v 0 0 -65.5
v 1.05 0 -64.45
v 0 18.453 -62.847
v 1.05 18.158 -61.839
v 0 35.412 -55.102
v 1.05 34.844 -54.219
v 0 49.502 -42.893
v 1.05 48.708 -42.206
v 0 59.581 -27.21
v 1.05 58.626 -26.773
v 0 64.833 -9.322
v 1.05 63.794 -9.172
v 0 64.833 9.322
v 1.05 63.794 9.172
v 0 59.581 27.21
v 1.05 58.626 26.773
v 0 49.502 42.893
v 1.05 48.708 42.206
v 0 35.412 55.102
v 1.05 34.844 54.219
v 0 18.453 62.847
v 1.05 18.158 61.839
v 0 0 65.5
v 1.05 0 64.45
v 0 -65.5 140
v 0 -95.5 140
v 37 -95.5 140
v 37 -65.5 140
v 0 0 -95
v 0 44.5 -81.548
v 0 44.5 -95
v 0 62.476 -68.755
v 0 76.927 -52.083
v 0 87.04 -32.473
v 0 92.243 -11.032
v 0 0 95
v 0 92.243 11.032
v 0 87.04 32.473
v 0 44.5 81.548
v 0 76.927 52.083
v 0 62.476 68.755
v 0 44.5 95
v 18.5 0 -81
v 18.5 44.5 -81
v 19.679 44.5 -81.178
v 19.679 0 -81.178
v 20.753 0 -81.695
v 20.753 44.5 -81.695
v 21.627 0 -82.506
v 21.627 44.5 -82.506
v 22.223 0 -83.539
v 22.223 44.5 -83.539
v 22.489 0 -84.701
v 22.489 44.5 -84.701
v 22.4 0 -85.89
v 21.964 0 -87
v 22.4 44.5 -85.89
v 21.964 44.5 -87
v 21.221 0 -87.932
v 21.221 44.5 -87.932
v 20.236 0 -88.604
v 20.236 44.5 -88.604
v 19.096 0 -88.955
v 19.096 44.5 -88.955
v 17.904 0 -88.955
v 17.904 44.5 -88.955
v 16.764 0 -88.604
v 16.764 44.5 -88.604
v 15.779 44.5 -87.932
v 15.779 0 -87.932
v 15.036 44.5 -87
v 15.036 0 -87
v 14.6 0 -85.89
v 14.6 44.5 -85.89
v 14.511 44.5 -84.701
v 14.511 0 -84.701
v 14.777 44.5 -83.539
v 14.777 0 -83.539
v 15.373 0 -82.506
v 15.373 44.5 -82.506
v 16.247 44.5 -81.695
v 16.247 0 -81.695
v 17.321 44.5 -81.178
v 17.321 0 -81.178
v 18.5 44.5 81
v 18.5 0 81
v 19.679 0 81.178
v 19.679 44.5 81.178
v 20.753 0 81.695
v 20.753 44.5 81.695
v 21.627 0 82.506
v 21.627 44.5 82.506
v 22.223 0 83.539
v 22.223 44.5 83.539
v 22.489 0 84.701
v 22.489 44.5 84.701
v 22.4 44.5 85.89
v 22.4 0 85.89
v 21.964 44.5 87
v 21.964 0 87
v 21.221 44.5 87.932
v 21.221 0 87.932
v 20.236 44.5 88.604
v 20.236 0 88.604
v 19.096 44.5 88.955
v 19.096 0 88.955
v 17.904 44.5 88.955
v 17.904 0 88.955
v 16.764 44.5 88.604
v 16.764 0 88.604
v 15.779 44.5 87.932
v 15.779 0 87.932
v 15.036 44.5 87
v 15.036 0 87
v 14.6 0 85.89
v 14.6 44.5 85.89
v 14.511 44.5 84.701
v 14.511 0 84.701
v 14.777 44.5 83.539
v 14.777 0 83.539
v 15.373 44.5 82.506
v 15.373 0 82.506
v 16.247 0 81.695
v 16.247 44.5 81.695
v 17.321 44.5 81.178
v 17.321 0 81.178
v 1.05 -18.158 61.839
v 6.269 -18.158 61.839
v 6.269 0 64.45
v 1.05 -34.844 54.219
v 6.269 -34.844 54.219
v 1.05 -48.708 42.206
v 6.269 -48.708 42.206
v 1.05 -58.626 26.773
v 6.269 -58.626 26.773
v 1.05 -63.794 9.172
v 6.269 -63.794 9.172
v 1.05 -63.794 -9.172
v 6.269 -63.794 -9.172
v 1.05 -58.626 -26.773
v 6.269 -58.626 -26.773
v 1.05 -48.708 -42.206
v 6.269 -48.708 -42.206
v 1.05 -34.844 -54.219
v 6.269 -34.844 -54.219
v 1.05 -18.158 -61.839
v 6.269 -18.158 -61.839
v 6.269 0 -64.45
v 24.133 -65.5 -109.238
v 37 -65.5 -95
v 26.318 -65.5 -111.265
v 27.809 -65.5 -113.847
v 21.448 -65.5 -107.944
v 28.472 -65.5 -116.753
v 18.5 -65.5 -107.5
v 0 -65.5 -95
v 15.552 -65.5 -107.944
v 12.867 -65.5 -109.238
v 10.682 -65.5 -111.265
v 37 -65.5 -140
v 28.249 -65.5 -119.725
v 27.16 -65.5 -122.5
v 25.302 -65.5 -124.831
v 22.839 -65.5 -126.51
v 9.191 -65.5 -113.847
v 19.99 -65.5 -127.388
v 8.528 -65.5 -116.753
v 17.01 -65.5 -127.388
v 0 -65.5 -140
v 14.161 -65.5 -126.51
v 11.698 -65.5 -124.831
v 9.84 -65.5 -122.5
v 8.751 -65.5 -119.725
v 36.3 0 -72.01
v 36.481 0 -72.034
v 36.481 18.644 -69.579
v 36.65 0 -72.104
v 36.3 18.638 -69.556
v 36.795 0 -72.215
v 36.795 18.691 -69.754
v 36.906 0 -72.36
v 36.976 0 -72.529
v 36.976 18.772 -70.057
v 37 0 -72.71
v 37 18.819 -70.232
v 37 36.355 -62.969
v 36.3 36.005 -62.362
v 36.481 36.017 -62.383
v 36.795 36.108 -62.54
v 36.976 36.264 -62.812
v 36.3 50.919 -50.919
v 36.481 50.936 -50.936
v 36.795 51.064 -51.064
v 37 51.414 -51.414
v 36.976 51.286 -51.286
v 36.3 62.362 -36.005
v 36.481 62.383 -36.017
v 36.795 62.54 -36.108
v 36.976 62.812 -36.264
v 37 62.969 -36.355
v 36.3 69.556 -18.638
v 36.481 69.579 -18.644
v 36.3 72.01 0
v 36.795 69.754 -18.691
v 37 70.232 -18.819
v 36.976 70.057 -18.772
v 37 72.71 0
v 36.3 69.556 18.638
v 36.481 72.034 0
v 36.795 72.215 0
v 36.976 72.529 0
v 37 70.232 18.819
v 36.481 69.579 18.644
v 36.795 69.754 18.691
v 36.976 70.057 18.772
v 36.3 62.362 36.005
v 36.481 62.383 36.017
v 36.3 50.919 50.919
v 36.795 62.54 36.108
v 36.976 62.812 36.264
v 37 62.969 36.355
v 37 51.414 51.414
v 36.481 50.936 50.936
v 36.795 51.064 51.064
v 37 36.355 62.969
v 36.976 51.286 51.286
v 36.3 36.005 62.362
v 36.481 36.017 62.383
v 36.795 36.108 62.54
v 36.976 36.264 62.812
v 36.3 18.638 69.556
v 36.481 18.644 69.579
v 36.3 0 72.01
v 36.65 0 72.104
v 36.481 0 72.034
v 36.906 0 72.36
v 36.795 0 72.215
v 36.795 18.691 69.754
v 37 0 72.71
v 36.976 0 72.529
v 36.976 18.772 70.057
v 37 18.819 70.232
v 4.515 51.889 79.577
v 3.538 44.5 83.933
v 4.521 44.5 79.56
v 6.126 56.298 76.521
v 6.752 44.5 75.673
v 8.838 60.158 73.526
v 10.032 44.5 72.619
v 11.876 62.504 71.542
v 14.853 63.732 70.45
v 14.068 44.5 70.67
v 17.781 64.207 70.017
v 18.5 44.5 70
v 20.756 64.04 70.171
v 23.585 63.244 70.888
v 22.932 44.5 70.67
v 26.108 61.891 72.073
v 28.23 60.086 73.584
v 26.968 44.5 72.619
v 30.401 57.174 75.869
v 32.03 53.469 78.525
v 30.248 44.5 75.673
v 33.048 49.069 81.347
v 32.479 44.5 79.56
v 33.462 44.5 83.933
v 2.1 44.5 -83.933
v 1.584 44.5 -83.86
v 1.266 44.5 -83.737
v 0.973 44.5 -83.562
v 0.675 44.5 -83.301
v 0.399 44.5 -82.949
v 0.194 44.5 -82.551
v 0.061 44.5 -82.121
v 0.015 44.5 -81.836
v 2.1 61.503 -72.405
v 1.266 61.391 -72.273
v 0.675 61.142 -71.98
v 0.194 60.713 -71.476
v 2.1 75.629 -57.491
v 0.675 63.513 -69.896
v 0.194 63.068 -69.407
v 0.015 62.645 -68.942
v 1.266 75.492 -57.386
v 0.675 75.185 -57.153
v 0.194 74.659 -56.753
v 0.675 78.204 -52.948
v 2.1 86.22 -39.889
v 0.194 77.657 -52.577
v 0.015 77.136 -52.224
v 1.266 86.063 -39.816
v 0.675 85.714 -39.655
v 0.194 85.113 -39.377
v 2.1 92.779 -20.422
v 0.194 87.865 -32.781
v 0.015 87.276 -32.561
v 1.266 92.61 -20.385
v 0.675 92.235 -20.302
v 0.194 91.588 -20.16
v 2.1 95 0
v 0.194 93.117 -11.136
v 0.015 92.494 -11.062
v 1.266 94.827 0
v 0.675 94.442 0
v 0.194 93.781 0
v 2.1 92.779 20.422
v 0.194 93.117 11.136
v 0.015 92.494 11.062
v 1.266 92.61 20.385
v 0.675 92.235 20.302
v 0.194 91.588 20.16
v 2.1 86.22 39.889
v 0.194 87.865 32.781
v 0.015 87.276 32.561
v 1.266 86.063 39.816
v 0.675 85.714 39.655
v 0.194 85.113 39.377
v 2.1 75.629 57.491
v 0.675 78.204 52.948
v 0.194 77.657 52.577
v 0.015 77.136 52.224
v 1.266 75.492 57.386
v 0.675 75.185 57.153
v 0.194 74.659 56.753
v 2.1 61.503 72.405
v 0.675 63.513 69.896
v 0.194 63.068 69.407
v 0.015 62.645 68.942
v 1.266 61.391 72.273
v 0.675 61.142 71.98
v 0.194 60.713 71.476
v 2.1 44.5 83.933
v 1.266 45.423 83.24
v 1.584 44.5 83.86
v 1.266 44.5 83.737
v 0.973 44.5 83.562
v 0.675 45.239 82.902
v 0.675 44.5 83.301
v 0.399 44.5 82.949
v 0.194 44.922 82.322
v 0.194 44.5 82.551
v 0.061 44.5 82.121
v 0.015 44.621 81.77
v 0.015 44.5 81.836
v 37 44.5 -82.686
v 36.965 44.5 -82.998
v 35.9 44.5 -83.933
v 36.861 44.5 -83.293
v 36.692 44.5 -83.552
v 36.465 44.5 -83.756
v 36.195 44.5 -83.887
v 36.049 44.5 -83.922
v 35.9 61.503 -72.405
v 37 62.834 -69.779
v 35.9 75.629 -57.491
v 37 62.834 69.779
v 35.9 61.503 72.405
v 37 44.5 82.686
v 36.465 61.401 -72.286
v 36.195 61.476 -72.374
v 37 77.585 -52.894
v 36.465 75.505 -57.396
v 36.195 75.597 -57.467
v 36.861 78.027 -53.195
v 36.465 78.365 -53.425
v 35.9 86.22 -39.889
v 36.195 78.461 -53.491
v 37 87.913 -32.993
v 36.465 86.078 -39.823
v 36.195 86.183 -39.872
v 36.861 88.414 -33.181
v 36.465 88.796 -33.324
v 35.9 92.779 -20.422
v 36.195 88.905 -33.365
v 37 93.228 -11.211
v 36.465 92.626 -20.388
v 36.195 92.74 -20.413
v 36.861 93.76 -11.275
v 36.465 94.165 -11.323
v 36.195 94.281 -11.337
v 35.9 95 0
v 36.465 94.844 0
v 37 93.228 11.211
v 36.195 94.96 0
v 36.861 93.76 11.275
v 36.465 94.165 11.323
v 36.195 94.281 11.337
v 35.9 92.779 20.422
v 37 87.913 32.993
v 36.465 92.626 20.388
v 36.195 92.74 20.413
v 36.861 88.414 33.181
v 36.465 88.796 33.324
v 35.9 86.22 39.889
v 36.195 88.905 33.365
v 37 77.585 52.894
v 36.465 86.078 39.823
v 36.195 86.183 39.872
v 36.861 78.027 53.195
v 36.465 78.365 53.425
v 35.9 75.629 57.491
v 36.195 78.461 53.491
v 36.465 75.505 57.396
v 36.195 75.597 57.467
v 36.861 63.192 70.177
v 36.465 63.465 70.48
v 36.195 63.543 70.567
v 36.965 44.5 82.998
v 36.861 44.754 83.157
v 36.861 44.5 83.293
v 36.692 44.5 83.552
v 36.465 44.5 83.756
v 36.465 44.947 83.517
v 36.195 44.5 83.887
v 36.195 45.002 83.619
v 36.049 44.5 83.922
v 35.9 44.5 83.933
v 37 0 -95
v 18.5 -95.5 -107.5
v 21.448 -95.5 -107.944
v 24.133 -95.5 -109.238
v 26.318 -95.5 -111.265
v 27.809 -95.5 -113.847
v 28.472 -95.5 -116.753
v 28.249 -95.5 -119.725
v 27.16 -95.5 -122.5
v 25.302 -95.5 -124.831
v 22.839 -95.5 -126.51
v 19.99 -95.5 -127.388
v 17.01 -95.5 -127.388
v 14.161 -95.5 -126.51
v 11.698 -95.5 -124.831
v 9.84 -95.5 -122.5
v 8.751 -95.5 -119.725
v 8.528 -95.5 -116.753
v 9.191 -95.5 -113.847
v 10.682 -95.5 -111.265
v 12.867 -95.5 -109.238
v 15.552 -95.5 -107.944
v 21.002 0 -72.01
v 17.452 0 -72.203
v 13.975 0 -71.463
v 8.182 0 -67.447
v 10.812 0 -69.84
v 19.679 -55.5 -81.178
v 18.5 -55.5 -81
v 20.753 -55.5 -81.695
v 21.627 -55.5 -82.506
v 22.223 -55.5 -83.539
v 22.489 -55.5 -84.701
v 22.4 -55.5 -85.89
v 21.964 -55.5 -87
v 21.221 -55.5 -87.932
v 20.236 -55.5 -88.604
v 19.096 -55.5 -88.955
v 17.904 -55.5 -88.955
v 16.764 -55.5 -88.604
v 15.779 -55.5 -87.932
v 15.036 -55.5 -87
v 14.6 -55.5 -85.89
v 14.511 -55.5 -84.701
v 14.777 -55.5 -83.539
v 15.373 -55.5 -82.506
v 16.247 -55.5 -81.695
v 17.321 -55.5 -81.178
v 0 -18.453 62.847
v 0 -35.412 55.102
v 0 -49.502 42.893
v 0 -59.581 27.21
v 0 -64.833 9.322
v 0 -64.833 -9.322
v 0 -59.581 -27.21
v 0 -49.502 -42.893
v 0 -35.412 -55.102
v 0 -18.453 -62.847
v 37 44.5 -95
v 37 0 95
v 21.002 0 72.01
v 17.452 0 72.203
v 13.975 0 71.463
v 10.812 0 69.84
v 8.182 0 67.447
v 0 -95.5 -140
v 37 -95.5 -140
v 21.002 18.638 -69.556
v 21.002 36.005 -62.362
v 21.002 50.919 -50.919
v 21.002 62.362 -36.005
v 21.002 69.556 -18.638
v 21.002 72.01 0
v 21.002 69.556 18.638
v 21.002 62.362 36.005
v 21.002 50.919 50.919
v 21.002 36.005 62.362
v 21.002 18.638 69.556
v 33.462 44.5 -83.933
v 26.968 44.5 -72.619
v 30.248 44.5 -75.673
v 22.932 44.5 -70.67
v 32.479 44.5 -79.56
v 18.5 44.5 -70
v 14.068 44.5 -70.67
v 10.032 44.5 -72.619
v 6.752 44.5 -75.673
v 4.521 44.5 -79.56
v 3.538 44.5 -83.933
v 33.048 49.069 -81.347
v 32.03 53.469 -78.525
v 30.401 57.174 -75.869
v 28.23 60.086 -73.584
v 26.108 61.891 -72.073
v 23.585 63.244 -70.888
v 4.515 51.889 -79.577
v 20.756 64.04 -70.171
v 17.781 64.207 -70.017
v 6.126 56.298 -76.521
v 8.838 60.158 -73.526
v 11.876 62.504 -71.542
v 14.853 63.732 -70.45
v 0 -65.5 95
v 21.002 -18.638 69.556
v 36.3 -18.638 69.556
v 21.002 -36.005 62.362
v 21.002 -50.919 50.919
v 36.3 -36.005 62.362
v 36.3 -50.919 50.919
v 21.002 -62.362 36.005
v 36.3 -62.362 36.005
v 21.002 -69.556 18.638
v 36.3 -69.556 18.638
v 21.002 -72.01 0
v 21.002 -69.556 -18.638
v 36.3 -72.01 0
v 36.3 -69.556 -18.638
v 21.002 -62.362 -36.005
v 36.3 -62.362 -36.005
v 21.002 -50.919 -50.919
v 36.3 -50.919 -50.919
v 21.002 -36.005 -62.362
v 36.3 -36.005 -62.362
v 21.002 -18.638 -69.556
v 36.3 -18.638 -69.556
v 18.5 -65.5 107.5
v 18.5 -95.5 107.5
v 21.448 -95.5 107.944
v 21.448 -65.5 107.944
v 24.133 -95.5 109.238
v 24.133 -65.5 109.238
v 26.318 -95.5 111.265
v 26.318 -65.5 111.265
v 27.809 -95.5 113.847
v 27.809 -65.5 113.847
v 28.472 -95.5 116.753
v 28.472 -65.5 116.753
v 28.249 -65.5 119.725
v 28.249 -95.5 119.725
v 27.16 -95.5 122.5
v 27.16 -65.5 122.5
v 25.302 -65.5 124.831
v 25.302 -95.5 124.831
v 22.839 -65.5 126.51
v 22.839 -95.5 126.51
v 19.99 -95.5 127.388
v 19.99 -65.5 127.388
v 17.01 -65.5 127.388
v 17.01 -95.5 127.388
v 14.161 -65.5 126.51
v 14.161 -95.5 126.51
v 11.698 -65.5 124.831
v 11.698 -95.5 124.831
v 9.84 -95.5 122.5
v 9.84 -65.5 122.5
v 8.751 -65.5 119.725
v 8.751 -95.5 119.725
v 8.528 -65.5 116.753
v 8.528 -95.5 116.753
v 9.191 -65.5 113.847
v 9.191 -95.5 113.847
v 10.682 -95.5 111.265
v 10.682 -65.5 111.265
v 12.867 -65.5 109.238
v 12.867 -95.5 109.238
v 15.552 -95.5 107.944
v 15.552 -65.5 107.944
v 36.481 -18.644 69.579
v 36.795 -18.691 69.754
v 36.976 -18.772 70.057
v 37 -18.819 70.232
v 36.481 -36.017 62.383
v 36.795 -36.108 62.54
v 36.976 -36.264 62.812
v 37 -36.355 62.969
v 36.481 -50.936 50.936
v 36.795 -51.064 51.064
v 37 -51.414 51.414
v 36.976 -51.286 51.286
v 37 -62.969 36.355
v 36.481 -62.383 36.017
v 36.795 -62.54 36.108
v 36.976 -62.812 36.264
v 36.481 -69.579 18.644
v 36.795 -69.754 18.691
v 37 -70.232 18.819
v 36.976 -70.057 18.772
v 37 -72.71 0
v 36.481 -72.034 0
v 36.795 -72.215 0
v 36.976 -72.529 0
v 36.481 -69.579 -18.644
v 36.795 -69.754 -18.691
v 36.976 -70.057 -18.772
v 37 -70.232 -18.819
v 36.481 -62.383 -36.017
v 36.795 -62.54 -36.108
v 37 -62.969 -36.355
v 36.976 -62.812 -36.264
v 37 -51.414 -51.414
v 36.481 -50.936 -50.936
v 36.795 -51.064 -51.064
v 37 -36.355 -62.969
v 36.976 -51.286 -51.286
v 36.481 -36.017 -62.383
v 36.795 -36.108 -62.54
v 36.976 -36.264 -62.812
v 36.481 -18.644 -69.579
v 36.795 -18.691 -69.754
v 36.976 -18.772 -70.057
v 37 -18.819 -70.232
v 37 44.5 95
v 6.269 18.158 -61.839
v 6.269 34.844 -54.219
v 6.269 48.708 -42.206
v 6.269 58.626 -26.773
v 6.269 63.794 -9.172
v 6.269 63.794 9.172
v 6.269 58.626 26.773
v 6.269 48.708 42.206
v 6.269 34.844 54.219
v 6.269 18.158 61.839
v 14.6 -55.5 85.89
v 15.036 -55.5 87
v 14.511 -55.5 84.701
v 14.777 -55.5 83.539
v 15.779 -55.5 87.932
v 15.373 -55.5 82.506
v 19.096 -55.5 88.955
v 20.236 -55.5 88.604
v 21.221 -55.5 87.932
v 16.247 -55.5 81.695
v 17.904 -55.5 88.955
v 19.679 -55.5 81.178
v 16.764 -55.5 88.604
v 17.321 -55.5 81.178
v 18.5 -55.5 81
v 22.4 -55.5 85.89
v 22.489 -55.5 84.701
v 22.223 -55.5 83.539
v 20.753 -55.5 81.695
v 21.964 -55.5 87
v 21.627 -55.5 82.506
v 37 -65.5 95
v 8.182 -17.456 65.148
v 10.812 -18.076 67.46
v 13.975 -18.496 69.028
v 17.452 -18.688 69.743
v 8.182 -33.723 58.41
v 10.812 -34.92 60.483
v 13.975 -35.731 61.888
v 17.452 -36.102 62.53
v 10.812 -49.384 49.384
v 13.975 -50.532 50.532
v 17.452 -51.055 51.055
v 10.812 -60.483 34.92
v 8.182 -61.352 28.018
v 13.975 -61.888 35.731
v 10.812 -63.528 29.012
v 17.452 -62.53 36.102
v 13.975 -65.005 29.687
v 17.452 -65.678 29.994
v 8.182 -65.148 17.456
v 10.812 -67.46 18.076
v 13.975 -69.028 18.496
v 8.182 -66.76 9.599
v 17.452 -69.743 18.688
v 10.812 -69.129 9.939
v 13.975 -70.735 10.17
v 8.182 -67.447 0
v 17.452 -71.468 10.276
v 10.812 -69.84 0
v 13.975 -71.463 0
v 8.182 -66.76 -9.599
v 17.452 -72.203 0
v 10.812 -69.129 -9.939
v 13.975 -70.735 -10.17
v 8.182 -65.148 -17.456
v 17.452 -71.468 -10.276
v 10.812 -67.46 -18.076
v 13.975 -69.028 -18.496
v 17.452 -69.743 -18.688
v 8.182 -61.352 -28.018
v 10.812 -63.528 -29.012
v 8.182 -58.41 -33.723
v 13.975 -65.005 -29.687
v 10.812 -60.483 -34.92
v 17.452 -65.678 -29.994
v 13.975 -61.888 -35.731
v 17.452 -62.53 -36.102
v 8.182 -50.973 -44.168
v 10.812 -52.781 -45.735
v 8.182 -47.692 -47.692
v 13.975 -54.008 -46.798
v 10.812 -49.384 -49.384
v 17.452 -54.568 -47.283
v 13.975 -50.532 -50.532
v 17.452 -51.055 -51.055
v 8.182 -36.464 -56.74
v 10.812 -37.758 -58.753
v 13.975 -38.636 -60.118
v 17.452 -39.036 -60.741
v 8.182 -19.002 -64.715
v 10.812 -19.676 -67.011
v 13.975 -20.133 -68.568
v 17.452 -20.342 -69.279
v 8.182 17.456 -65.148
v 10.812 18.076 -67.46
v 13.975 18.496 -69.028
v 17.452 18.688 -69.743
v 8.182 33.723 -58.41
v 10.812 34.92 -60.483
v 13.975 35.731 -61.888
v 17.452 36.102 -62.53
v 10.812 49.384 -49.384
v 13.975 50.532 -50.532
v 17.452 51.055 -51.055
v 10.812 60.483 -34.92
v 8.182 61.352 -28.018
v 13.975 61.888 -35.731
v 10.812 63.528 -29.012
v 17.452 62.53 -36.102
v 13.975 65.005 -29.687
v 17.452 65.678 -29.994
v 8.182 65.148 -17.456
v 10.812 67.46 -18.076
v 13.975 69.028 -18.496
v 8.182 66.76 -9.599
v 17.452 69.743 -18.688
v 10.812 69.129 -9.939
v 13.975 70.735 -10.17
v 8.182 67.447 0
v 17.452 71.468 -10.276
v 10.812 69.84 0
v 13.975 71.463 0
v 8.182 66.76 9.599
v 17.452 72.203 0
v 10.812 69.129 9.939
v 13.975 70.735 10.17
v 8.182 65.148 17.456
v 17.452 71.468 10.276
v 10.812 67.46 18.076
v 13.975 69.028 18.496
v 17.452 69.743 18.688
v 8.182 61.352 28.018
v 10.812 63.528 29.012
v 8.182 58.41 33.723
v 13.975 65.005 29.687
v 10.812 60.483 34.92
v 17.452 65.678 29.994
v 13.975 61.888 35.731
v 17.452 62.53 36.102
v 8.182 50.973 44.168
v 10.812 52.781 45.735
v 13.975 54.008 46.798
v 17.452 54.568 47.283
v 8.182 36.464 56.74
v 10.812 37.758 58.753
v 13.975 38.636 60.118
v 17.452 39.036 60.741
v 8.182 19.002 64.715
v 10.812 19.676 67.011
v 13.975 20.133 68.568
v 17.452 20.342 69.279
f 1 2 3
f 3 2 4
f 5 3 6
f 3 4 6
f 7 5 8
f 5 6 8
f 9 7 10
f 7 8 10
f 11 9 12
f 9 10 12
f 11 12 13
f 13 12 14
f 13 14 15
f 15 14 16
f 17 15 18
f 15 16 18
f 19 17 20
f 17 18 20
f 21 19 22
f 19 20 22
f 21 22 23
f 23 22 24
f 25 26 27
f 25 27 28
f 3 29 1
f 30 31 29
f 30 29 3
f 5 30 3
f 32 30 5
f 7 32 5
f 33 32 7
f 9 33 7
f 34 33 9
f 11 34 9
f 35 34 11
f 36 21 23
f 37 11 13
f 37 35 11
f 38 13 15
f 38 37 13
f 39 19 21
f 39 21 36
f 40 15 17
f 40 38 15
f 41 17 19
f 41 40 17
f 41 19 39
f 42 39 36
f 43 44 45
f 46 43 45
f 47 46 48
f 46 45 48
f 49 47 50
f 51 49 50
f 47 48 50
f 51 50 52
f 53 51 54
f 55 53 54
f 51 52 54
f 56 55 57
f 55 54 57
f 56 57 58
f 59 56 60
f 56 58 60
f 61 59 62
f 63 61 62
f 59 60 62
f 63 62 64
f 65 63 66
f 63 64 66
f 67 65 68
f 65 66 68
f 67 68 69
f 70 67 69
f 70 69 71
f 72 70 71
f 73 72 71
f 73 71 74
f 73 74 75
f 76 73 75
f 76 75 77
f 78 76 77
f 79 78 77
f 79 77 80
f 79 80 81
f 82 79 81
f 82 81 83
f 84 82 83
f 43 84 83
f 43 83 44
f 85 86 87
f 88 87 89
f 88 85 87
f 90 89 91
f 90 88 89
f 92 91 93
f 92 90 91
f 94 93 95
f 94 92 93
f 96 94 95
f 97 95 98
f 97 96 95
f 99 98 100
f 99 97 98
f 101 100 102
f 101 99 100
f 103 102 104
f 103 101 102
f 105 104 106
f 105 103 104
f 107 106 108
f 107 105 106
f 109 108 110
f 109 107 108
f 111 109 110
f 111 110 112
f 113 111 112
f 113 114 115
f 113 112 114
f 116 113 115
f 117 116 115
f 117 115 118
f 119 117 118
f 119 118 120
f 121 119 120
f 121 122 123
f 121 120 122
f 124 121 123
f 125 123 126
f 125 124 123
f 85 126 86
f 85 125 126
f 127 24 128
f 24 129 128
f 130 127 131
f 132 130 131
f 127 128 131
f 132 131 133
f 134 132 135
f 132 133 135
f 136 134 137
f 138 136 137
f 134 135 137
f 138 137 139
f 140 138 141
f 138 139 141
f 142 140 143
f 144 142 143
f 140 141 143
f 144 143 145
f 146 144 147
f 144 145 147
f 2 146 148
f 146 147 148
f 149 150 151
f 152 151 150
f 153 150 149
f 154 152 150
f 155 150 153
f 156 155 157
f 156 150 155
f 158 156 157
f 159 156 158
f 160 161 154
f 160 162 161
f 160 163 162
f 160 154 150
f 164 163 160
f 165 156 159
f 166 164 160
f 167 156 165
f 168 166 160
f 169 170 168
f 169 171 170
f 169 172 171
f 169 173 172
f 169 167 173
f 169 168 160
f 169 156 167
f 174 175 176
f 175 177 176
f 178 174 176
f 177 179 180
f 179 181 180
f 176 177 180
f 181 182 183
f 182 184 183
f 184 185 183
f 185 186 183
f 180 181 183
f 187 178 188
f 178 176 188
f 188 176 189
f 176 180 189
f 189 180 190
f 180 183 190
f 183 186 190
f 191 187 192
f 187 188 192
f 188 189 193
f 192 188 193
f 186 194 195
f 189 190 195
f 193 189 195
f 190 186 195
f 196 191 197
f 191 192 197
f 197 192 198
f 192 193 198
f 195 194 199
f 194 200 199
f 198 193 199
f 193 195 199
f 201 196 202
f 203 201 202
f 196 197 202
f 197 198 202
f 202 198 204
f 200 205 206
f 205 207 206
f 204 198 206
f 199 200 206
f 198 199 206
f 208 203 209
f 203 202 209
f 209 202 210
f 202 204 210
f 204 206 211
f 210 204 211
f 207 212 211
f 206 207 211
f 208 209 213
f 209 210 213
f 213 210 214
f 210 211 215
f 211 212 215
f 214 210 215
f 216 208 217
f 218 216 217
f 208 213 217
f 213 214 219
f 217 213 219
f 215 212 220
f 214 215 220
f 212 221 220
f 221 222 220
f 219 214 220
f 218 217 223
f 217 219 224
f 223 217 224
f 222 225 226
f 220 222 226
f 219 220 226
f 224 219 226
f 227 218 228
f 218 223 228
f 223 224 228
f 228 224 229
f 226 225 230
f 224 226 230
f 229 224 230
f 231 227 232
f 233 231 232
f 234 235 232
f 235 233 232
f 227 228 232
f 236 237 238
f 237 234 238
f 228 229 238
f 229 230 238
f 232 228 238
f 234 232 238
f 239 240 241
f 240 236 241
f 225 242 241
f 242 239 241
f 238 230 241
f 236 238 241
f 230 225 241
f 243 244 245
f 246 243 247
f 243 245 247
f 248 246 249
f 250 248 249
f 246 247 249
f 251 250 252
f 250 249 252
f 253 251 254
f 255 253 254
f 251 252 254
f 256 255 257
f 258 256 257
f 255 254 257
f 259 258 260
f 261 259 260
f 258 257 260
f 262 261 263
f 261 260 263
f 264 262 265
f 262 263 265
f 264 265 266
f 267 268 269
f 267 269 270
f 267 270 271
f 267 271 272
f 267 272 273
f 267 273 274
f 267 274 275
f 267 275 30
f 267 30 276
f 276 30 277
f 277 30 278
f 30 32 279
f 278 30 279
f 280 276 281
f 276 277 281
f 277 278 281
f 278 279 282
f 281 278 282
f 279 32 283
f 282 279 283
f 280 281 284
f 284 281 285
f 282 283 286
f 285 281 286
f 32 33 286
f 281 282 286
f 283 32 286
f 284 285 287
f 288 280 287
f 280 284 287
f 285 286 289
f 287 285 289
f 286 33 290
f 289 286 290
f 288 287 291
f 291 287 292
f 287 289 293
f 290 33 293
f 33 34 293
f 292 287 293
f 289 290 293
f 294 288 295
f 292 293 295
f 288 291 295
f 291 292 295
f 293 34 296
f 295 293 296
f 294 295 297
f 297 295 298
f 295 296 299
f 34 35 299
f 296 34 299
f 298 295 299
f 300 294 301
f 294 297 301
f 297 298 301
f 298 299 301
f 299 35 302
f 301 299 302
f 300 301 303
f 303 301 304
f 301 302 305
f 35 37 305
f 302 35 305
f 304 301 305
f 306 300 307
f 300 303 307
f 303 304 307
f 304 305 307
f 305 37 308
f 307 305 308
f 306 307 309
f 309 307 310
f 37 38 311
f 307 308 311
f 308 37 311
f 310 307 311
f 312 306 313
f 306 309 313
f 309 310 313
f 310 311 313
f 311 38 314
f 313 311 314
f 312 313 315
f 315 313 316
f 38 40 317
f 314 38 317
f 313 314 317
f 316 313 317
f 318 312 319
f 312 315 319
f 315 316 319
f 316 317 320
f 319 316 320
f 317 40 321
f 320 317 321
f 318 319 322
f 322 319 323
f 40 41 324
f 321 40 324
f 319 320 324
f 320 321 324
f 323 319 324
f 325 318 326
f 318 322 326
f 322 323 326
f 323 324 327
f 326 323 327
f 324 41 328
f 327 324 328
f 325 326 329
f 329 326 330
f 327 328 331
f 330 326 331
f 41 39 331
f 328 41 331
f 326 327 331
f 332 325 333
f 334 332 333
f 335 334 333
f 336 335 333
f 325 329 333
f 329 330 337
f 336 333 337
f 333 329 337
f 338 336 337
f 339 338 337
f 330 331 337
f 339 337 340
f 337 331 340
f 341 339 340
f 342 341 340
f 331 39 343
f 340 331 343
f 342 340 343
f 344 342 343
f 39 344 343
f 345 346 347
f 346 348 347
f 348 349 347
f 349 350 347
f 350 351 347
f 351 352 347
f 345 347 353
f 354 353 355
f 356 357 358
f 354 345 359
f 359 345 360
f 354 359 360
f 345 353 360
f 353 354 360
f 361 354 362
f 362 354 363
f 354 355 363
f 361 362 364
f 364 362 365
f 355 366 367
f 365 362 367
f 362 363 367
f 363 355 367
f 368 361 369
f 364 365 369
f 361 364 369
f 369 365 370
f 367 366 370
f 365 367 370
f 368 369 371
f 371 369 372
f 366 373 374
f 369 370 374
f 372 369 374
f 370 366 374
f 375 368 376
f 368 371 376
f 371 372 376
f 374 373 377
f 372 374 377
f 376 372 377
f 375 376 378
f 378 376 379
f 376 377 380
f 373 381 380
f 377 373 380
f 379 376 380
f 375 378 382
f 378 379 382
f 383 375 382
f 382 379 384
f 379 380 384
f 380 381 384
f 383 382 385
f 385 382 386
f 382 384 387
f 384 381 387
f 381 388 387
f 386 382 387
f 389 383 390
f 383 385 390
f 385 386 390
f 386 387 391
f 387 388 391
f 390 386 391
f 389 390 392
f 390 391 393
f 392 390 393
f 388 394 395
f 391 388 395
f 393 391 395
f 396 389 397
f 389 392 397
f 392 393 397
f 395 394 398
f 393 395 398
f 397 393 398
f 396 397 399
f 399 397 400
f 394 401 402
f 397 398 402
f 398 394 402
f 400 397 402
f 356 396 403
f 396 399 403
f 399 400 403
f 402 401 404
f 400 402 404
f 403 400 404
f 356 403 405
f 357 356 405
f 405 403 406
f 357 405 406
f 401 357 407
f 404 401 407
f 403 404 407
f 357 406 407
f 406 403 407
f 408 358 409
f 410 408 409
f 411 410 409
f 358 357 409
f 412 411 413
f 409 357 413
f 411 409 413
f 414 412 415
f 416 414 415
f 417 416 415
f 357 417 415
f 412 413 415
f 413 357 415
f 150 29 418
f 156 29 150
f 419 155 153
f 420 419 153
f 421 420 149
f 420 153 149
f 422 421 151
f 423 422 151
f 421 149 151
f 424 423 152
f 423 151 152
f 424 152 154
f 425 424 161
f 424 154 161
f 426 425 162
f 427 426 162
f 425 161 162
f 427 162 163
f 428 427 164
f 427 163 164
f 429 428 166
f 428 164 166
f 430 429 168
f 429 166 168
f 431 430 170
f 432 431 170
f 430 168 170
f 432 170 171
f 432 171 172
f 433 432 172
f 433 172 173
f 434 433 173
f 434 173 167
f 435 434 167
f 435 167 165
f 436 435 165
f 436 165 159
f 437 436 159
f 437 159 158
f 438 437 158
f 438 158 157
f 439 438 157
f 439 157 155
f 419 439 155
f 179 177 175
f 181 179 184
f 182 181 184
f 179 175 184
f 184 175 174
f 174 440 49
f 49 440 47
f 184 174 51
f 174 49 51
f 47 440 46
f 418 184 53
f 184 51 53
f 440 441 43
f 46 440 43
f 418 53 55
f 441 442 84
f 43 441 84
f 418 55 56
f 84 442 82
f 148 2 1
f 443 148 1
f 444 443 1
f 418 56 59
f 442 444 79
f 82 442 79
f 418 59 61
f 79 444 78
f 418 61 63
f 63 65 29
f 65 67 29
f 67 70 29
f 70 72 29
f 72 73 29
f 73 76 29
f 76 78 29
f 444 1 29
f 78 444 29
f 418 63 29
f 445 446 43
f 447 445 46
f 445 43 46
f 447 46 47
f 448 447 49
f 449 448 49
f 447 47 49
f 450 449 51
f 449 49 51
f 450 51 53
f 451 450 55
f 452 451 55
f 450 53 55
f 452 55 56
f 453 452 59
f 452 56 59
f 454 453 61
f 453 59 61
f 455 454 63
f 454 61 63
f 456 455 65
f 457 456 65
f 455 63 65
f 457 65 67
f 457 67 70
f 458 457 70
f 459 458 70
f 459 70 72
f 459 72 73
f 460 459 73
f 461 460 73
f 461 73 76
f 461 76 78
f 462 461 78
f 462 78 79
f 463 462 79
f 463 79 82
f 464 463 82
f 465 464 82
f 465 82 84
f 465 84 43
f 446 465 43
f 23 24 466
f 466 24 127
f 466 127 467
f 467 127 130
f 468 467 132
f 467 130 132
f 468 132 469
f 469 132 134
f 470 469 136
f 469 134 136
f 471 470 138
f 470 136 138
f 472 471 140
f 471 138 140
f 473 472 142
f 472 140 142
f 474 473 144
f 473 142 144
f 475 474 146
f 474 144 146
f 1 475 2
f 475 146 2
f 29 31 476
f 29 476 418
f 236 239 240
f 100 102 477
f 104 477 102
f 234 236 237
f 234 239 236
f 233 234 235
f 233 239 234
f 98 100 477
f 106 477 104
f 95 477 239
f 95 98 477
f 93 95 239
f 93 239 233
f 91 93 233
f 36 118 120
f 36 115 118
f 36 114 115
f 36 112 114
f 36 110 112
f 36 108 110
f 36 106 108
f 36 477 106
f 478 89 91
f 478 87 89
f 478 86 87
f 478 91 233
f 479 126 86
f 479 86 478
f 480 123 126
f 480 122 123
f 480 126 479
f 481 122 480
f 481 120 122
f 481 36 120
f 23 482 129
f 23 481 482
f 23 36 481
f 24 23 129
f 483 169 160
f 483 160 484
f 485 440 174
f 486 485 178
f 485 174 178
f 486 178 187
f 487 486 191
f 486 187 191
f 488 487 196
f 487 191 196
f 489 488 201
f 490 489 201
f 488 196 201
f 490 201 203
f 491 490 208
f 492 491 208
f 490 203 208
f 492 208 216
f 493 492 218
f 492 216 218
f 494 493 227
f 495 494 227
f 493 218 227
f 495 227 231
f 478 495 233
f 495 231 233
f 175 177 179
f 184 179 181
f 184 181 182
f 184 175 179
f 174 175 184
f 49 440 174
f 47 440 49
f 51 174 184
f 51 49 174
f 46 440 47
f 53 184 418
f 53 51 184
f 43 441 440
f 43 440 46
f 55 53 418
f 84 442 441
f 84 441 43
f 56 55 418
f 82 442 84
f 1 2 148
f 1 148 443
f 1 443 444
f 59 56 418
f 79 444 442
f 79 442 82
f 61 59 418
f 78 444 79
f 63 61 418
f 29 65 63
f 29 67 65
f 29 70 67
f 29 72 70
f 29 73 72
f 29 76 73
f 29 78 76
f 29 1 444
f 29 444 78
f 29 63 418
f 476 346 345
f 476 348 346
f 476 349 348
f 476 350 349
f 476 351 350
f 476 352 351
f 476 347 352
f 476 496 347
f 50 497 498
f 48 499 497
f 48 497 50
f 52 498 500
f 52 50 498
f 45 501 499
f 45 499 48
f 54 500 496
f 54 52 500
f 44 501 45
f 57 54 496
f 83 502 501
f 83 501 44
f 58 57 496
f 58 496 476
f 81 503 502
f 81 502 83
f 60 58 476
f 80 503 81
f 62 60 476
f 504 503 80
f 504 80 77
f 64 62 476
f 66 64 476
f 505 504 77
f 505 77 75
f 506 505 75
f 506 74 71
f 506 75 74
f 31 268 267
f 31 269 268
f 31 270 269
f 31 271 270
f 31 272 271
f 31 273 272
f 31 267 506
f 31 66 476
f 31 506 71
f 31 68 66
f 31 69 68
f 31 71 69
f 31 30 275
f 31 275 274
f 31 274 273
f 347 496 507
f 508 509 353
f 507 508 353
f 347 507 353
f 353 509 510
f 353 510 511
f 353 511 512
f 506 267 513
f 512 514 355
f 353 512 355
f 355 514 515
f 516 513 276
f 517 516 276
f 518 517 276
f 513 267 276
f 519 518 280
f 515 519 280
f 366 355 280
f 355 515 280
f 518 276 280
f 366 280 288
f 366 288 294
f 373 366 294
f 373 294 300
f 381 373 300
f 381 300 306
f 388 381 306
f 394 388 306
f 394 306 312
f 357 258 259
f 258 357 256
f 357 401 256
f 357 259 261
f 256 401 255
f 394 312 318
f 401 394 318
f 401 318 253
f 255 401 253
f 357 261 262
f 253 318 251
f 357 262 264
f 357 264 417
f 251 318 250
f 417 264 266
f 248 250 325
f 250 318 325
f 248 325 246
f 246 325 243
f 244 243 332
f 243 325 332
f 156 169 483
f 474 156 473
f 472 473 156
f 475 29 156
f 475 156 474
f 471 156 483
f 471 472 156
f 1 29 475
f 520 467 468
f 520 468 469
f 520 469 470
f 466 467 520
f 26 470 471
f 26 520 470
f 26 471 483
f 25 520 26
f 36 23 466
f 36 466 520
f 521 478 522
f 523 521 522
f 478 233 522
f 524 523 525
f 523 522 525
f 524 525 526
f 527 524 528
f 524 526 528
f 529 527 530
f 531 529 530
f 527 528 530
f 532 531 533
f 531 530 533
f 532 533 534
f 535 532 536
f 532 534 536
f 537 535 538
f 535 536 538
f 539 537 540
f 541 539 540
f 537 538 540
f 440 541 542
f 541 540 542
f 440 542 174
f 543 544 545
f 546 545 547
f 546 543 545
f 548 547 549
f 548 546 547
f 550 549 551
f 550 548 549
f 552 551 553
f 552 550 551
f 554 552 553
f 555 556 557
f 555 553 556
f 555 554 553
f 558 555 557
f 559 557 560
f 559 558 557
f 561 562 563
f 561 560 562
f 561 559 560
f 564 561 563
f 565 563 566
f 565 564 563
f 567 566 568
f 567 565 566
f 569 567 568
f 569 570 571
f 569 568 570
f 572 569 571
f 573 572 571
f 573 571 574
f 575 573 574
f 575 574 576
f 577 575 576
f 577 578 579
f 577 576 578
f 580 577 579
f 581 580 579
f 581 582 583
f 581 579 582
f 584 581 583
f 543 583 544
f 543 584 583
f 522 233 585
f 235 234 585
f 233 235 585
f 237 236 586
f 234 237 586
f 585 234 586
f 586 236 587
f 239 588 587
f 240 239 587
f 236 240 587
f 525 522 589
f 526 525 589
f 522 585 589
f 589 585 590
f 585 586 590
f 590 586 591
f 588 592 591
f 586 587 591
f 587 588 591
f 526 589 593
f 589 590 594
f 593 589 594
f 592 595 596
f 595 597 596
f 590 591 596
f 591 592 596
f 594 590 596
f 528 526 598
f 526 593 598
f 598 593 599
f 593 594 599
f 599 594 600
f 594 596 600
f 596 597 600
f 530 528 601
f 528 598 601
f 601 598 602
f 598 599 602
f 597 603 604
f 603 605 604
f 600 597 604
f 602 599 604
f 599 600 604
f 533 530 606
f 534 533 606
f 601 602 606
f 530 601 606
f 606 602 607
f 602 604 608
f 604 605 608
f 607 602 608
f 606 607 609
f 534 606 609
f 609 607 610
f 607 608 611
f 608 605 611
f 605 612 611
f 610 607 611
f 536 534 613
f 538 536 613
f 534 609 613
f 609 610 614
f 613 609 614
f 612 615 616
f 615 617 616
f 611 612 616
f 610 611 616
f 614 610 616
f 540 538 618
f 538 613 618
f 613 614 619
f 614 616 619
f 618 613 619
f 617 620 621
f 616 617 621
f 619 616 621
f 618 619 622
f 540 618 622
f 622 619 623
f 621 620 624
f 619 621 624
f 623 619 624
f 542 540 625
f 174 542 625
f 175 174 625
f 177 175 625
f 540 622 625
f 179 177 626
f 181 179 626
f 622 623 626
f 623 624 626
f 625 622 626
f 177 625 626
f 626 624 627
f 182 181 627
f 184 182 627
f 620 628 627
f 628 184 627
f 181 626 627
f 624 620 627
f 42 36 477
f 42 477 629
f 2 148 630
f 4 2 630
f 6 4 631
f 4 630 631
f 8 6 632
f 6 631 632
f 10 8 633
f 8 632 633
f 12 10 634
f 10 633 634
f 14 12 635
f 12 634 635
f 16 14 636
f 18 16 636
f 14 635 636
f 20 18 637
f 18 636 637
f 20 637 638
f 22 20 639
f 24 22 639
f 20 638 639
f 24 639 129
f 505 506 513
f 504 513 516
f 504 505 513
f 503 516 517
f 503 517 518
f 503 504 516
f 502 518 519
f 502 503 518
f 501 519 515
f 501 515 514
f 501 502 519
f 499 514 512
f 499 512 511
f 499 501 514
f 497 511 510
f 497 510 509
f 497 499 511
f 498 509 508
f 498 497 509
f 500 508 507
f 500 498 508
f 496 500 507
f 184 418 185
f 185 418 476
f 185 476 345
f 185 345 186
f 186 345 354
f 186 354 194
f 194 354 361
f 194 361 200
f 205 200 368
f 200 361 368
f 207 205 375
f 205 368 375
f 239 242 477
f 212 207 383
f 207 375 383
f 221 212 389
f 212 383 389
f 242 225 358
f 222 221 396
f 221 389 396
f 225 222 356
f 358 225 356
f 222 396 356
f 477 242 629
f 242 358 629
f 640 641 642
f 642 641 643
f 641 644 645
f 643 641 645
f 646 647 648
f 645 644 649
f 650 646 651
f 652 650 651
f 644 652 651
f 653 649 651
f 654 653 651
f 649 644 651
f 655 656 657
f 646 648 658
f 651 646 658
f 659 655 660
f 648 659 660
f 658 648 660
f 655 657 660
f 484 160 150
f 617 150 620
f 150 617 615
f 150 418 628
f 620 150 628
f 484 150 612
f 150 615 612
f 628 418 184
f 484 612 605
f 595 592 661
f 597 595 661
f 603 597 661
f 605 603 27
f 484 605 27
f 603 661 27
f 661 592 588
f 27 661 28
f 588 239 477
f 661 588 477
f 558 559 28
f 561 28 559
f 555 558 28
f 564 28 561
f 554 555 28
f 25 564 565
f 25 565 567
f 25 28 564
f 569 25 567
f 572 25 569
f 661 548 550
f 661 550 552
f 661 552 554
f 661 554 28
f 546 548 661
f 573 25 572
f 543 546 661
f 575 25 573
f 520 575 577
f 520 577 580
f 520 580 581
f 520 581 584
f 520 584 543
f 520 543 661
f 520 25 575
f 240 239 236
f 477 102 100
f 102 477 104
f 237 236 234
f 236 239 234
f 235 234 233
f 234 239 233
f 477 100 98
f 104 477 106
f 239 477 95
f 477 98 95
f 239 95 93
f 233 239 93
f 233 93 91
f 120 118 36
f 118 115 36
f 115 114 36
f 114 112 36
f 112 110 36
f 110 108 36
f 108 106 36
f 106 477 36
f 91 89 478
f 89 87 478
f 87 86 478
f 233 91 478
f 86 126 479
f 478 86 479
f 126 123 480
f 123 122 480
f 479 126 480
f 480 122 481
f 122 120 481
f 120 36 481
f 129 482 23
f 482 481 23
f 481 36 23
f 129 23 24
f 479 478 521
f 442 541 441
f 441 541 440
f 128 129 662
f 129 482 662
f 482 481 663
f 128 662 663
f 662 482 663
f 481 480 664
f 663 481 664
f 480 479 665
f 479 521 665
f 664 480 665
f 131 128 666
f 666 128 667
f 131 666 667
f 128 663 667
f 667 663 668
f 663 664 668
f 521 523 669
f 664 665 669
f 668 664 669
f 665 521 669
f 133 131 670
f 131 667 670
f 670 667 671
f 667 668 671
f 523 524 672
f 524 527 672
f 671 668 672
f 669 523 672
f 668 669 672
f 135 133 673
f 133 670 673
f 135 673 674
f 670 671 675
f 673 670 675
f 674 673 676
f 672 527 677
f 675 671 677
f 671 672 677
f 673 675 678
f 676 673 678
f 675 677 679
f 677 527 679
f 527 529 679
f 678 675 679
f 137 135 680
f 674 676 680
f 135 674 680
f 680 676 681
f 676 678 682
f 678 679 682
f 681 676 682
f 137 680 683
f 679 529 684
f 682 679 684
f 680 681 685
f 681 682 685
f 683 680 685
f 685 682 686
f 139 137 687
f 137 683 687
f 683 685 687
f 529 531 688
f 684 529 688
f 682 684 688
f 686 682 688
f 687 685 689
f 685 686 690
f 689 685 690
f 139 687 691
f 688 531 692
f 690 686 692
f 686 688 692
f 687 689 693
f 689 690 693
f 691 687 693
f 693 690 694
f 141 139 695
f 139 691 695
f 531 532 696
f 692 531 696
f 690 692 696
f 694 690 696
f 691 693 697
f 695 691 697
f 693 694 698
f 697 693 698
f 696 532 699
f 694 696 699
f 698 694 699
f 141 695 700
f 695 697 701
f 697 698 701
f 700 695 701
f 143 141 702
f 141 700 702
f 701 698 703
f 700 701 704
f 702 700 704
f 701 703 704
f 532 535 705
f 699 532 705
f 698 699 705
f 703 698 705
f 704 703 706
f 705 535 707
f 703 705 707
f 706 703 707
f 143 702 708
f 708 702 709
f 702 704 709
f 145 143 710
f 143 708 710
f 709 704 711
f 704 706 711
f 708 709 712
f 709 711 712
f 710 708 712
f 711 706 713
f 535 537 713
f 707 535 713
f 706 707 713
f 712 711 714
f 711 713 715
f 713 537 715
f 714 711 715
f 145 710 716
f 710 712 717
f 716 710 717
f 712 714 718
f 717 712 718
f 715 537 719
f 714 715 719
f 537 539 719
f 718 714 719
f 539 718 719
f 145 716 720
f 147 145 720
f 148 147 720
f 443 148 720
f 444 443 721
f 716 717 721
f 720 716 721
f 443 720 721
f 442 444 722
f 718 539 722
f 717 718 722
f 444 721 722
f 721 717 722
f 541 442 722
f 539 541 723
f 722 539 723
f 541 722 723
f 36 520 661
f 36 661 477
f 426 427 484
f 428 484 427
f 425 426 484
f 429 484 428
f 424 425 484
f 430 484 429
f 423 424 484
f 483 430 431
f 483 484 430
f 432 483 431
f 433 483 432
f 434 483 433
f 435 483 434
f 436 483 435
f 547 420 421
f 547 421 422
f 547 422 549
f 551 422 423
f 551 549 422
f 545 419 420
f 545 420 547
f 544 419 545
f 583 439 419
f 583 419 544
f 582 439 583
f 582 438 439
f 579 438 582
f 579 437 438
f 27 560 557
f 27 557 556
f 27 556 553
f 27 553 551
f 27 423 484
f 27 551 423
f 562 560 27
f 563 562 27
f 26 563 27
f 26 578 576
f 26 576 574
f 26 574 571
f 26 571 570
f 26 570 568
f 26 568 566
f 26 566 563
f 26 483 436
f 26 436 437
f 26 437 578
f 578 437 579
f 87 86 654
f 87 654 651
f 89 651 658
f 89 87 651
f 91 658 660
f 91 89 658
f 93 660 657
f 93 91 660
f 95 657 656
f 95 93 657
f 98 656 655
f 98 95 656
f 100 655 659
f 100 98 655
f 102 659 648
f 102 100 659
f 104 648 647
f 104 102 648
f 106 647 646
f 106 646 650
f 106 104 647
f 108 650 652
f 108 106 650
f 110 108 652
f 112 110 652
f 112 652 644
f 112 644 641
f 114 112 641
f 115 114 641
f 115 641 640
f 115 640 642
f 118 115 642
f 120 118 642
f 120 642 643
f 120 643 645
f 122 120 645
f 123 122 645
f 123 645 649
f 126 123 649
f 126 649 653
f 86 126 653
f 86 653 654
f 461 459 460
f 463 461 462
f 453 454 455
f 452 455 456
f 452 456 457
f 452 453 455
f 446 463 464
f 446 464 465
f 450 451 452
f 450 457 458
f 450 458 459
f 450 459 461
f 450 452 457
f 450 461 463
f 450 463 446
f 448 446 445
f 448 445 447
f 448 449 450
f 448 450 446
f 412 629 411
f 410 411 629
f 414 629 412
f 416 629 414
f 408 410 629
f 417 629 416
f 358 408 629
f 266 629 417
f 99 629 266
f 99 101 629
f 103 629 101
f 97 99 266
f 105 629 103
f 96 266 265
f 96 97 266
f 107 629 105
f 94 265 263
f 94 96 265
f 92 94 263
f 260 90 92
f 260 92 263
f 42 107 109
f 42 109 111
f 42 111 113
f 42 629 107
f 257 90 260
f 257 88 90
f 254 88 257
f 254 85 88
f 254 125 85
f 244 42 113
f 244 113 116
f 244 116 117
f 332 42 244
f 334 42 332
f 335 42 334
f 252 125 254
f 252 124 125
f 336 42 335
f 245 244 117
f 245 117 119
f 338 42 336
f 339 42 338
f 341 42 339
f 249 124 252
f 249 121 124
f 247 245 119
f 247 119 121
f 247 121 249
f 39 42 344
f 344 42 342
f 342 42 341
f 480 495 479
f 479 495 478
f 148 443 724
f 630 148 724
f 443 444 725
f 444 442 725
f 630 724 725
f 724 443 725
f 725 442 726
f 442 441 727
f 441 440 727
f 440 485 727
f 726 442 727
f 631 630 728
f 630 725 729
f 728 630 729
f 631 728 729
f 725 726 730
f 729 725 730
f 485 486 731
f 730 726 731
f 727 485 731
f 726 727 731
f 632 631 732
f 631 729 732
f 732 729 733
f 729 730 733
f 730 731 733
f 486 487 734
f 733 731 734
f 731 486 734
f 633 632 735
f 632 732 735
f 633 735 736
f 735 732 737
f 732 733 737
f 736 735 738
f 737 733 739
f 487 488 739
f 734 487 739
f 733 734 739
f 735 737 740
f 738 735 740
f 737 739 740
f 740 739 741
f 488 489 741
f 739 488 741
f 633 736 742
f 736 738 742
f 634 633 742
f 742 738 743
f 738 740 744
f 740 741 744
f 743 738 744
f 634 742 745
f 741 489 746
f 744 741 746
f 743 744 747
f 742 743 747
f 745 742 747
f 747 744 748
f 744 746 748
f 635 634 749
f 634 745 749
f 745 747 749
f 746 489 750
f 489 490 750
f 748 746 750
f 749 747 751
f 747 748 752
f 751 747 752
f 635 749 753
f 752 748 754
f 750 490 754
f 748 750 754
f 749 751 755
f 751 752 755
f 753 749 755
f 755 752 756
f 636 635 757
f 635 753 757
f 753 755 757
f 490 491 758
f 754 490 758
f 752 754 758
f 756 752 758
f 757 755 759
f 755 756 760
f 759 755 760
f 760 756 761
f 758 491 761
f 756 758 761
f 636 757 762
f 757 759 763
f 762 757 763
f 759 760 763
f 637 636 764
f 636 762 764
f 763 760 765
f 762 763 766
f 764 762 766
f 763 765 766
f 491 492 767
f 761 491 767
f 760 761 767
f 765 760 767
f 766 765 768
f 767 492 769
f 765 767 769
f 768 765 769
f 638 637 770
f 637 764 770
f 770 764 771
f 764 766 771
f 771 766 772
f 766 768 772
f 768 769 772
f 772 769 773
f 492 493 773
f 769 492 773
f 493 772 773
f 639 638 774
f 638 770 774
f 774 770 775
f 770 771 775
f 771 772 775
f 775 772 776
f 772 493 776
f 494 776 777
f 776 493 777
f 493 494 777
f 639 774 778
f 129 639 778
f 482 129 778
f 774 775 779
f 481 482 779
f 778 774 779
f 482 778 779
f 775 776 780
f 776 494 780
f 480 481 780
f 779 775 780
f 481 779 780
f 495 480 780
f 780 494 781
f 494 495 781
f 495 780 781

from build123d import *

# Parameters (mm, degrees)
BOSS_EXTRU_2_DEPTH           = 37
ESQUISSE4_R                  = 15
ENL_V_MAT_EXTRU_1_DEPTH      = 37
ESQUISSE6_R                  = 4
ENL_V_MAT_EXTRU_2_DEPTH      = 100
ESQUISSE7_R                  = 10
ENL_V_MAT_EXTRU_3_DEPTH      = 217.169494105
FRACTIONNER2_SURFACE_1_BACK  = 341.675
FRACTIONNER2_SURFACE_1_DEPTH = 683.35
FRACTIONNER2_SURFACE_2_BACK  = 341.675
FRACTIONNER2_SURFACE_2_DEPTH = 683.35


with BuildPart() as part:
    # Esquisse1 → Révolution1 (revolve)
    with BuildSketch(Plane.XY, mode=Mode.PRIVATE) as r_volution1_sk:
        with BuildLine():
            Line((0, 92.899985), (0, 65.5))
            Line((0, 65.5), (1.05, 64.45))
            Line((1.05, 64.45), (6.268972406, 64.45))
            ThreePointArc((6.268972406, 64.45), (12.33952319, 70.755688713), (21.002086329, 72.01))
            Line((21.002086329, 72.01), (36.3, 72.01))
            ThreePointArc((36.3, 72.01), (36.794969719, 72.215020225), (37, 72.709985779))
            Line((37, 72.709985779), (37, 93.899984804))
            ThreePointArc((37, 93.899984804), (36.677822915, 94.67781224), (35.9, 95.000000237))
            Line((35.9, 95.000000237), (2.1, 95.000000237))
            ThreePointArc((2.1, 95.000000237), (0.615070373, 94.38491909), (0, 92.899985))
        make_face()
    revolve(r_volution1_sk.sketch.rotate(Axis((-0.001288092, 0, 0), (1, 0, 0)), 270), axis=Axis((-0.001288092, 0, 0), (1, 0, 0)))

    # Esquisse2 → Boss.-Extru.2 (add)
    with BuildSketch(Plane.ZY):
        with BuildLine():
            Line((-95.000000237, 44.5), (-95.000000237, -65.5))
            Line((-95.000000237, -65.5), (-140.000000237, -65.5))
            Line((-140.000000237, -65.5), (-140.000000237, -95.5))
            Line((-140.000000237, -95.5), (140.000000237, -95.5))
            Line((140.000000237, -95.5), (140.000000237, -65.5))
            Line((140.000000237, -65.5), (95.000000237, -65.5))
            Line((95.000000237, -65.5), (95.000000237, 44.5))
            Line((95.000000237, 44.5), (81.548496081, 44.5))
            ThreePointArc((81.548496081, 44.5), (90.017390752, 22.962503678), (92.899985, 0))
            ThreePointArc((92.899985, 0), (0, -92.899985), (-92.899985, 0))
            ThreePointArc((-92.899985, 0), (-90.017390752, 22.962503678), (-81.548496081, 44.5))
            Line((-81.548496081, 44.5), (-95.000000237, 44.5))
        make_face()
    extrude(amount=-BOSS_EXTRU_2_DEPTH)

    # Esquisse4 → Enlèv. mat.-Extru.1 (cut)
    with BuildSketch(Plane(origin=(0, 44.5, 0), x_dir=(1, 0, 0), z_dir=(0, 1, 0))):
        with Locations((18.5, 85.000000237)):
            Circle(ESQUISSE4_R)
    enl_v_mat_extru_1 = extrude(amount=ENL_V_MAT_EXTRU_1_DEPTH, mode=Mode.SUBTRACT)

    # Esquisse6 → Enlèv. mat.-Extru.2 (cut)
    with BuildSketch(Plane(origin=(0, 44.5, 0), x_dir=(1, 0, 0), z_dir=(0, 1, 0))):
        with Locations(Location((18.5, 85.000000237, 0), (0, 0, 270))):
            Circle(ESQUISSE6_R)
    enl_v_mat_extru_2 = extrude(amount=-ENL_V_MAT_EXTRU_2_DEPTH, mode=Mode.SUBTRACT)

    # Esquisse7 → Enlèv. mat.-Extru.3 (cut, through all)
    with BuildSketch(Plane(origin=(0, -65.5, 0), x_dir=(1, 0, 0), z_dir=(0, 1, 0))):
        with Locations(Location((18.5, 117.500000237, 0), (0, 0, 270))):
            Circle(ESQUISSE7_R)
    enl_v_mat_extru_3 = extrude(amount=-ENL_V_MAT_EXTRU_3_DEPTH, mode=Mode.SUBTRACT)

    # Symétrie1: Enlèv. mat.-Extru.1, Enlèv. mat.-Extru.2, Enlèv. mat.-Extru.3 across plane
    add(enl_v_mat_extru_1.mirror(Plane.XY), mode=Mode.SUBTRACT)
    add(enl_v_mat_extru_2.mirror(Plane.XY), mode=Mode.SUBTRACT)
    add(enl_v_mat_extru_3.mirror(Plane.XY), mode=Mode.SUBTRACT)


with BuildPart() as body_2:
    # Fractionner2: the piece behind the surface
    add(part.part)
    # Fractionner2 surface: a surface, the sketch's curves swept straight by 683.35 mm
    with BuildLine(Plane(origin=(37, 0, 0), x_dir=(0, 0, -1), z_dir=(1, 0, 0)).offset(-FRACTIONNER2_SURFACE_1_BACK), mode=Mode.PRIVATE) as fractionner2_surface_1_path:
        Line((-95.000000237, 0), (95.000000237, 0))
    fractionner2_surface_1 = Shell.extrude(fractionner2_surface_1_path.wire(), (1 * FRACTIONNER2_SURFACE_1_DEPTH, 0 * FRACTIONNER2_SURFACE_1_DEPTH, 0 * FRACTIONNER2_SURFACE_1_DEPTH))
    split(bisect_by=fractionner2_surface_1, keep=Keep.BOTTOM)


with BuildPart() as part_1:
    add(part.part)

    # Fractionner2: split by a surface, the side it looks to stays
    # Fractionner2 surface: a surface, the sketch's curves swept straight by 683.35 mm
    with BuildLine(Plane(origin=(37, 0, 0), x_dir=(0, 0, -1), z_dir=(1, 0, 0)).offset(-FRACTIONNER2_SURFACE_2_BACK), mode=Mode.PRIVATE) as fractionner2_surface_2_path:
        Line((-95.000000237, 0), (95.000000237, 0))
    fractionner2_surface_2 = Shell.extrude(fractionner2_surface_2_path.wire(), (1 * FRACTIONNER2_SURFACE_2_DEPTH, 0 * FRACTIONNER2_SURFACE_2_DEPTH, 0 * FRACTIONNER2_SURFACE_2_DEPTH))
    split(bisect_by=fractionner2_surface_2, keep=Keep.TOP)


solid = Compound([body_2.part, part_1.part])
